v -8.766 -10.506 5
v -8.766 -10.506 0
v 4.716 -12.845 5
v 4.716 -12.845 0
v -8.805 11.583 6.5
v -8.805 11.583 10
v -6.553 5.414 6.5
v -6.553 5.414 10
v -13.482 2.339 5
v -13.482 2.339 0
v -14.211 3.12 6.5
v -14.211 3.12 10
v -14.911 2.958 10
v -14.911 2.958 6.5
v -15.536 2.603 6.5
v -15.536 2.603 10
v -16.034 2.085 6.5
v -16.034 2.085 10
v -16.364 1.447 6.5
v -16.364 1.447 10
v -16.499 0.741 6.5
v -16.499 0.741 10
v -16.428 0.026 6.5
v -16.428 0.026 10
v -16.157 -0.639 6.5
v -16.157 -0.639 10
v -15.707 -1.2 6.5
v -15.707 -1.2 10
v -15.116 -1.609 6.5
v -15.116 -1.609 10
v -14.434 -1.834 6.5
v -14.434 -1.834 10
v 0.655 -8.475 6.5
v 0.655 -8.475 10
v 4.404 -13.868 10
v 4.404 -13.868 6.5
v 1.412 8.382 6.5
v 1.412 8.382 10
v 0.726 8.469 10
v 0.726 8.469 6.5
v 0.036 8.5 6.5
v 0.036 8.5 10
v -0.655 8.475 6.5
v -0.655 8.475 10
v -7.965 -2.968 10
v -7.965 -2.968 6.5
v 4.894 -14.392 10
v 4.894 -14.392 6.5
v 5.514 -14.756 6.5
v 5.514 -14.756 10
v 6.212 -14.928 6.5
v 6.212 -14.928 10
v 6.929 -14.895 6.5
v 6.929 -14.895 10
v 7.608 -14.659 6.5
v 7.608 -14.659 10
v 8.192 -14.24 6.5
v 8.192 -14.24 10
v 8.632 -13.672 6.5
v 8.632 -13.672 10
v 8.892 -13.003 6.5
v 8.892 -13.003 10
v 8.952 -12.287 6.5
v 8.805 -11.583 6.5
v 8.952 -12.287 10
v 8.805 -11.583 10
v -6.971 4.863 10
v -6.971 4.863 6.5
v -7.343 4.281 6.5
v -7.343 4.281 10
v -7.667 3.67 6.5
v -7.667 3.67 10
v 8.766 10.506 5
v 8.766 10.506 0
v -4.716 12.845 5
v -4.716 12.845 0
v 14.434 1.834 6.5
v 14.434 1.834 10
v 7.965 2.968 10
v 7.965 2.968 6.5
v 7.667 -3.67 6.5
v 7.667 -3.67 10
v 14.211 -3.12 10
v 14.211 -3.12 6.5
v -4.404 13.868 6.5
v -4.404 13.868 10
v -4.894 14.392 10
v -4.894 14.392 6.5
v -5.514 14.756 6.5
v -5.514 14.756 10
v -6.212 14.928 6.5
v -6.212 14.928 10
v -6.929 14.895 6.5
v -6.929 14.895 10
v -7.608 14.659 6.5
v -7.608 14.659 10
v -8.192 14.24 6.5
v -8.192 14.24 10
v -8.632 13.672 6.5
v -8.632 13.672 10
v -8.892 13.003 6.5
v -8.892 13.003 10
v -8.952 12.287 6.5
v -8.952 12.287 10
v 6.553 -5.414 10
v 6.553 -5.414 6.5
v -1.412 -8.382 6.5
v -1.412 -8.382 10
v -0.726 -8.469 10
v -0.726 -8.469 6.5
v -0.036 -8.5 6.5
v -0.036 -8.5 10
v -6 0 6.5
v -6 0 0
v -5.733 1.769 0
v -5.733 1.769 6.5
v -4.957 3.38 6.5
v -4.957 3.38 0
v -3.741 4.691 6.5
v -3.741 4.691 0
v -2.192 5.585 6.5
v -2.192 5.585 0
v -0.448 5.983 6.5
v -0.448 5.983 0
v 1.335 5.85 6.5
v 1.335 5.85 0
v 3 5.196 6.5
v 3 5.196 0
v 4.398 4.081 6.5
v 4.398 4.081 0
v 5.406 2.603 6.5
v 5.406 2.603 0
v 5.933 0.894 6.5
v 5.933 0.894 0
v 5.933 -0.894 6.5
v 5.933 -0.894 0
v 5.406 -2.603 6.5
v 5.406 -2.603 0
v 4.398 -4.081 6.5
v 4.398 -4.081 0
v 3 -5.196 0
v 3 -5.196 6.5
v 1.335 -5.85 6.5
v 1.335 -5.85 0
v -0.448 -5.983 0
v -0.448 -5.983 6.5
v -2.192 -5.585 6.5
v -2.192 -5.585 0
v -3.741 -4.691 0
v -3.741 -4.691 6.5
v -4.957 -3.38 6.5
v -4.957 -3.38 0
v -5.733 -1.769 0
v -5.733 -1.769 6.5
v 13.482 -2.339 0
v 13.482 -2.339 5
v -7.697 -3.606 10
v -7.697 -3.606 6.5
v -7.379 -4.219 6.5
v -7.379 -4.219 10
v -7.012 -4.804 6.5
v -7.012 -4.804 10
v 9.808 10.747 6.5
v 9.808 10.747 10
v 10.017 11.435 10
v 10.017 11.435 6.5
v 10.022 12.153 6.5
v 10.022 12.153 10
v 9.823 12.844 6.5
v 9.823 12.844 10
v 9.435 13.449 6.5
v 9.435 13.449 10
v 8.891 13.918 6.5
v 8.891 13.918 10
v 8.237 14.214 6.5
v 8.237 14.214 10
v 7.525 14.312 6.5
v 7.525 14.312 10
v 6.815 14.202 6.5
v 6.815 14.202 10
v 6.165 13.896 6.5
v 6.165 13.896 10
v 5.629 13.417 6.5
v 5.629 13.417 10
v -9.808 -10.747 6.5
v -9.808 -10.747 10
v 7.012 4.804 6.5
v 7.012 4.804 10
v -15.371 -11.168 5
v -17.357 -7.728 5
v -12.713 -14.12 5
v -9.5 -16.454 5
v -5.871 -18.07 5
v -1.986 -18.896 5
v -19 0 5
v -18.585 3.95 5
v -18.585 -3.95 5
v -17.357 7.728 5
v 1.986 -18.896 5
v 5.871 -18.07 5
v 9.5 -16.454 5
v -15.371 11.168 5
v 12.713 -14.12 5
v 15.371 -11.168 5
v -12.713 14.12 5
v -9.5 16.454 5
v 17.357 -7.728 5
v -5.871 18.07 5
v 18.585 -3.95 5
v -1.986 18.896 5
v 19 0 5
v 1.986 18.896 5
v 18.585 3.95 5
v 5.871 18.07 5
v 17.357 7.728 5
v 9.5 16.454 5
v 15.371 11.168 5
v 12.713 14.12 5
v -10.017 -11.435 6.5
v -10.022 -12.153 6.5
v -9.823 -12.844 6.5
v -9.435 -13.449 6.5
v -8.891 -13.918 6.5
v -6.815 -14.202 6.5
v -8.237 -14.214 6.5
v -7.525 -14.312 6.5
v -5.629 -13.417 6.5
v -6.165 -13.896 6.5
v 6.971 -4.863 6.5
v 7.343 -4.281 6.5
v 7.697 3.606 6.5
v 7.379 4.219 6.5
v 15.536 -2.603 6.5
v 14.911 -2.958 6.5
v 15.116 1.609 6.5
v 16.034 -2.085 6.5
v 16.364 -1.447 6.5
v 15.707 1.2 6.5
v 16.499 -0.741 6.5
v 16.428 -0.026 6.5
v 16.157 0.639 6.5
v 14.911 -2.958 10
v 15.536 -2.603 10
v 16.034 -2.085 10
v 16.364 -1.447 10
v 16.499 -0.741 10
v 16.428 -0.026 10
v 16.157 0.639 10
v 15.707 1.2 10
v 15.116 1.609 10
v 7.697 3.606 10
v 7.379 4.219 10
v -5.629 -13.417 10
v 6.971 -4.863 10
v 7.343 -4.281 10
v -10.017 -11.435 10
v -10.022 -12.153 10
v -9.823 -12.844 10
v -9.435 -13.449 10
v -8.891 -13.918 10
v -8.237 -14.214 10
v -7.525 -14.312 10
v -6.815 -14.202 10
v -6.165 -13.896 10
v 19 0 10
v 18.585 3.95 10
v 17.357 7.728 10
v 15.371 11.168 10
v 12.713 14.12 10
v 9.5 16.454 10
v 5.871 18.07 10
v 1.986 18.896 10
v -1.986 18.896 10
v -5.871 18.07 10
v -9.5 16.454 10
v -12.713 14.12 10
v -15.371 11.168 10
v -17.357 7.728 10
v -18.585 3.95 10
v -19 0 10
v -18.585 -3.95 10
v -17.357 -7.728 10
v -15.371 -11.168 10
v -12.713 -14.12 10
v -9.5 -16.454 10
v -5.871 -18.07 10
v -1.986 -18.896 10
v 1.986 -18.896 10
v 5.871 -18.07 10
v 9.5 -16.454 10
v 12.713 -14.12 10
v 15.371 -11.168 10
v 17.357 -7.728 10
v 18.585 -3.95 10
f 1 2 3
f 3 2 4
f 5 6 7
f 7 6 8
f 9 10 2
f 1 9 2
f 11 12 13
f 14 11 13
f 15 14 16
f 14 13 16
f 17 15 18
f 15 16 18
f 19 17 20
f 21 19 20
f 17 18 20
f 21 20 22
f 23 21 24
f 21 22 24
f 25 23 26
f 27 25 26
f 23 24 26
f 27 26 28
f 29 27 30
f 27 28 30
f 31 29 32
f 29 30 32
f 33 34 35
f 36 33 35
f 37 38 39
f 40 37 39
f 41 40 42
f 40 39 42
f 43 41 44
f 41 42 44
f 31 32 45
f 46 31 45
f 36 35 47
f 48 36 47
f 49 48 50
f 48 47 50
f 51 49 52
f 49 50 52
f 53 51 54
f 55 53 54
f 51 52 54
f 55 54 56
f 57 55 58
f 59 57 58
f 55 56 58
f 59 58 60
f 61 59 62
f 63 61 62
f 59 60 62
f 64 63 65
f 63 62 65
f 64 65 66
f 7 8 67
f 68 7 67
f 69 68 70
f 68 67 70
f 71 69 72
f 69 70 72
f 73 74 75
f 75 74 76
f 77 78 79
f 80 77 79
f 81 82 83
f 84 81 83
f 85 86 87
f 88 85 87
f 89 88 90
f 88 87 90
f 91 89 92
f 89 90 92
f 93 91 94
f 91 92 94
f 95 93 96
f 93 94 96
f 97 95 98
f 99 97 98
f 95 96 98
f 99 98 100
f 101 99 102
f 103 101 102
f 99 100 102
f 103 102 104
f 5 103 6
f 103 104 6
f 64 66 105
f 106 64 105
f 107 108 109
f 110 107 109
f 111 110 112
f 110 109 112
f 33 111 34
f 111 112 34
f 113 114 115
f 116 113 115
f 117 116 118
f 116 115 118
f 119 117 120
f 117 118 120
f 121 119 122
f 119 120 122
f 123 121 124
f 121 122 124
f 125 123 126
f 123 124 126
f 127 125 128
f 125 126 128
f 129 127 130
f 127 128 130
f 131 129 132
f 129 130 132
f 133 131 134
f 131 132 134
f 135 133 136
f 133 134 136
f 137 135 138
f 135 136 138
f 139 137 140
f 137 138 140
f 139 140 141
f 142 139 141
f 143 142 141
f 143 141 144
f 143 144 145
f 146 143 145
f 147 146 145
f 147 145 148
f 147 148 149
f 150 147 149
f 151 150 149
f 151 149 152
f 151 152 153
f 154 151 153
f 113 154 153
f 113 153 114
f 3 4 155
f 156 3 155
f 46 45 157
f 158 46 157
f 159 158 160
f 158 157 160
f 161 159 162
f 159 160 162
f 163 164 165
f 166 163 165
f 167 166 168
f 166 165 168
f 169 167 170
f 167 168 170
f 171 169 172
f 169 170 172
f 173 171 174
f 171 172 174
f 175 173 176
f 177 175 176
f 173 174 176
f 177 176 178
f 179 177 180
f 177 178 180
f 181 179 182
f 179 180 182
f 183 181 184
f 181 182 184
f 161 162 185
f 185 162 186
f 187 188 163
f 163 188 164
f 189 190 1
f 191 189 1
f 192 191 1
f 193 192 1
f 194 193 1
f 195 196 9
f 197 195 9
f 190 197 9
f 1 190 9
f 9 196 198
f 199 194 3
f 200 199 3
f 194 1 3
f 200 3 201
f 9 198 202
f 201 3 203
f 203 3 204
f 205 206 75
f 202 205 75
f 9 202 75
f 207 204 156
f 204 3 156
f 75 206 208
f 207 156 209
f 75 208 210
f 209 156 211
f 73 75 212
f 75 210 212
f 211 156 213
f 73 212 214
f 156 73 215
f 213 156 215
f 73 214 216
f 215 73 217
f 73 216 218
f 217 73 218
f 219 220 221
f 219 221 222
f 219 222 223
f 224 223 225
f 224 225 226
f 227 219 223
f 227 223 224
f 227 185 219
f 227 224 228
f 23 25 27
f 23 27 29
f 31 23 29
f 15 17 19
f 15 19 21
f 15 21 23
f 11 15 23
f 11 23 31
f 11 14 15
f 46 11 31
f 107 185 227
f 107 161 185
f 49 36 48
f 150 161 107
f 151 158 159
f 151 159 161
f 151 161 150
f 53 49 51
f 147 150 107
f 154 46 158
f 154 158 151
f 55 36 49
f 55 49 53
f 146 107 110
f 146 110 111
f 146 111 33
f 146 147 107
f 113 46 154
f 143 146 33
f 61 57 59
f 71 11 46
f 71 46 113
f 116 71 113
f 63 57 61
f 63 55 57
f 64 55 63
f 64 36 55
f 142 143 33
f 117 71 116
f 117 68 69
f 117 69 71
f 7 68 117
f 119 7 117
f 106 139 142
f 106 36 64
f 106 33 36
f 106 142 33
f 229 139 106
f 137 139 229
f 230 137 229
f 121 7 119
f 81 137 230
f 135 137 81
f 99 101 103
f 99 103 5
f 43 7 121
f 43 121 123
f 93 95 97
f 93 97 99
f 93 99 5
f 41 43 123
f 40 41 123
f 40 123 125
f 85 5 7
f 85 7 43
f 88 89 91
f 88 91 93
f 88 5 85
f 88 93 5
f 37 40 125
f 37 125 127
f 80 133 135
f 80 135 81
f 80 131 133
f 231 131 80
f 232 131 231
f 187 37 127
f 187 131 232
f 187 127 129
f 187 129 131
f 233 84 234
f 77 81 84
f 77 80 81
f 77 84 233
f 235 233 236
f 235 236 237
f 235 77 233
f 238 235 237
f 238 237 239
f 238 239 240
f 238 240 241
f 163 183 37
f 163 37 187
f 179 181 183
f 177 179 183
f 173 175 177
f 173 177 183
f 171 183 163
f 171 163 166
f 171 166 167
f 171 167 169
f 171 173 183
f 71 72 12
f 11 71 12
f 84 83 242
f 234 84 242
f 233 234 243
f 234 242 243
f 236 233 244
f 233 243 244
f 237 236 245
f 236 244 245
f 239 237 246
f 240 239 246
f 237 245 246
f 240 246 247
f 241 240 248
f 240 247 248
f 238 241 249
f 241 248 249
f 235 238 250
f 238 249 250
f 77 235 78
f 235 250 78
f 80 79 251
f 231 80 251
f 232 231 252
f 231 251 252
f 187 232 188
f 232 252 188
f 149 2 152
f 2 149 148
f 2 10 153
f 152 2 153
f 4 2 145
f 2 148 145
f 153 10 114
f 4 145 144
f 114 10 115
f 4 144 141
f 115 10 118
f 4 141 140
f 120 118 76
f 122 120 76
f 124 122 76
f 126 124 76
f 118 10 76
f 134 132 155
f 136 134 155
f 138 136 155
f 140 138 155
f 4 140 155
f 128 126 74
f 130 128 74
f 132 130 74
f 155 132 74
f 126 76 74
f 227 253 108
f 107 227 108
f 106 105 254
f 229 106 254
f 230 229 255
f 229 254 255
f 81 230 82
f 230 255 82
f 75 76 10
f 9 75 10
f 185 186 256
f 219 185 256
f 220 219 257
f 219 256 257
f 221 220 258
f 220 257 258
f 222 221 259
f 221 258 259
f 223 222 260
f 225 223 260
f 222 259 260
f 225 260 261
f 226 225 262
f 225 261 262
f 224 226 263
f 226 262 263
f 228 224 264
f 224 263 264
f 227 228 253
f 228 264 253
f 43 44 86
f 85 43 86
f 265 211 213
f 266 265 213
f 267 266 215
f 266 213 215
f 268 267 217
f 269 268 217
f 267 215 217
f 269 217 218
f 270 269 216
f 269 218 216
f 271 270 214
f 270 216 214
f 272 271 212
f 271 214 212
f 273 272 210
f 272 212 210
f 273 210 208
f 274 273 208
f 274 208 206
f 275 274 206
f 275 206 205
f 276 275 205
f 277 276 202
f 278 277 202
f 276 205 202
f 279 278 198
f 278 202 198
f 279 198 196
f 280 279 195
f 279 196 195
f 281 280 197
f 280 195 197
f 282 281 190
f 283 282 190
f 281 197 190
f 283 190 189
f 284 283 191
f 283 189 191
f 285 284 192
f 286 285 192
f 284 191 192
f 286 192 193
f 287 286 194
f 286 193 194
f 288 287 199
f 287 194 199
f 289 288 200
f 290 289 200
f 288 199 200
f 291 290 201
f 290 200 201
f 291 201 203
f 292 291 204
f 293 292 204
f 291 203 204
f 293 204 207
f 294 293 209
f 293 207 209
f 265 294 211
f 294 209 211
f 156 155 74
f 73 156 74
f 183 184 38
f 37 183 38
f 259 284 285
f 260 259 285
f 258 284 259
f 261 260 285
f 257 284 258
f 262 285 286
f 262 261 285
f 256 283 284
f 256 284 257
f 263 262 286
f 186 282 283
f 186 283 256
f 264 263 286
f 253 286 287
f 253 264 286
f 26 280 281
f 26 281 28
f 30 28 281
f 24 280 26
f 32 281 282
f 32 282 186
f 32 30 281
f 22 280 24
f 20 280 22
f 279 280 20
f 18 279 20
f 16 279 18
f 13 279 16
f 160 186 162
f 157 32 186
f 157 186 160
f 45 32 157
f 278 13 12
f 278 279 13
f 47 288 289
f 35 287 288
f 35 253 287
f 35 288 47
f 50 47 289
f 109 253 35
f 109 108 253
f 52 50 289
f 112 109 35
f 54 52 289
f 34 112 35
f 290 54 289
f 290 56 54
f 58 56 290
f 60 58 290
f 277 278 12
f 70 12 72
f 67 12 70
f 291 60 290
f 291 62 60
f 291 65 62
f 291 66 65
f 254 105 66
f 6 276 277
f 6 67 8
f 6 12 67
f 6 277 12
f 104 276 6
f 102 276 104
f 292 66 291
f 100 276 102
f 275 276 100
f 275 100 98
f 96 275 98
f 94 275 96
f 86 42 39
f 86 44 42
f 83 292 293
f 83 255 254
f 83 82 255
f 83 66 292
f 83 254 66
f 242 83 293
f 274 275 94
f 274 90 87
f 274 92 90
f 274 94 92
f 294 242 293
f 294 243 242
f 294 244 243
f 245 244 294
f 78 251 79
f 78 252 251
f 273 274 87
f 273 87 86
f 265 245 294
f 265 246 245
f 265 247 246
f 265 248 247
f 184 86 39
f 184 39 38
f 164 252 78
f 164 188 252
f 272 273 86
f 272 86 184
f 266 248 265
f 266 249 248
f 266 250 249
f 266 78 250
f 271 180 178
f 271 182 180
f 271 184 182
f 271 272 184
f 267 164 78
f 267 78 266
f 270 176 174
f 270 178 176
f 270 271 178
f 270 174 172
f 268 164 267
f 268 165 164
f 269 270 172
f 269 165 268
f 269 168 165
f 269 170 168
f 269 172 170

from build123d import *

# Parameters (mm, degrees)
BOSS_EXTRUDE1_DEPTH = 5
SKETCH2_R           = 19
BOSS_EXTRUDE2_DEPTH = 5
CUT_EXTRUDE1_DEPTH  = 3.5
SKETCH4_R           = 6
CUT_EXTRUDE2_DEPTH  = 11


with BuildPart() as part:
    # Sketch1 → Boss-Extrude1 (new body)
    with BuildSketch(Plane.XY):
        Polygon((8.766334056, 10.506254671), (-4.715516416, 12.844995326), (-13.481850472, 2.338740655), (-8.766334056, -10.506254671), (4.715516416, -12.844995326), (13.481850472, -2.338740655), align=None)
    extrude(amount=BOSS_EXTRUDE1_DEPTH)

    # Sketch2 → Boss-Extrude2 (add)
    with BuildSketch(Plane.XY.offset(5)):
        Circle(SKETCH2_R)
    extrude(amount=BOSS_EXTRUDE2_DEPTH)

    # Sketch3 → Cut-Extrude1 (cut)
    with BuildSketch(Plane.XY.offset(10)):
        with BuildLine():
            Line((7.666666546, -3.670452843), (14.211444215, -3.120072648))
            ThreePointArc((14.211444215, -3.120072648), (16.499429689, -0.741033748), (14.433922262, 1.833530816))
            Line((14.433922262, 1.833530816), (7.964835621, 2.968399152))
            ThreePointArc((7.964835621, 2.968399152), (7.544489735, 3.915440541), (7.012038678, 4.80430157))
            Line((7.012038678, 4.80430157), (9.807784283, 10.74743539))
            ThreePointArc((9.807784283, 10.74743539), (8.89146974, 13.918407845), (5.629078153, 13.4169103))
            Line((5.629078153, 13.4169103), (1.411708737, 8.381949561))
            ThreePointArc((1.411708737, 8.381949561), (0.381373892, 8.49144004), (-0.654627868, 8.474754413))
            Line((-0.654627868, 8.474754413), (-4.403659932, 13.867508039))
            ThreePointArc((-4.403659932, 13.867508039), (-7.607959927, 14.659442582), (-8.804846066, 11.583379783))
            Line((-8.804846066, 11.583379783), (-6.553126885, 5.413550409))
            ThreePointArc((-6.553126885, 5.413550409), (-7.163115843, 4.575999499), (-7.666666546, 3.670452843))
            Line((-7.666666546, 3.670452843), (-14.211444215, 3.120072648))
            ThreePointArc((-14.211444215, 3.120072648), (-16.499429618, 0.741035318), (-14.433925359, -1.833530273))
            Line((-14.433925359, -1.833530273), (-7.964835621, -2.968399152))
            ThreePointArc((-7.964835621, -2.968399152), (-7.544489735, -3.915440541), (-7.012038678, -4.80430157))
            Line((-7.012038678, -4.80430157), (-9.807784283, -10.74743539))
            ThreePointArc((-9.807784283, -10.74743539), (-8.891470467, -13.918407381), (-5.629079261, -13.416911623))
            Line((-5.629079261, -13.416911623), (-1.411708737, -8.381949561))
            ThreePointArc((-1.411708737, -8.381949561), (-0.381373892, -8.49144004), (0.654627868, -8.474754413))
            Line((0.654627868, -8.474754413), (4.403659932, -13.867508039))
            ThreePointArc((4.403659932, -13.867508039), (7.607959014, -14.659443056), (8.804846772, -11.583381715))
            Line((8.804846772, -11.583381715), (6.553126885, -5.413550409))
            ThreePointArc((6.553126885, -5.413550409), (7.163115843, -4.575999499), (7.666666546, -3.670452843))
        make_face()
    extrude(amount=-CUT_EXTRUDE1_DEPTH, mode=Mode.SUBTRACT)

    # Sketch4 → Cut-Extrude2 (cut, through all)
    with BuildSketch(Plane(origin=(0, 0, 0), x_dir=(-1, 0, 0), z_dir=(0, 0, -1))):
        Circle(SKETCH4_R)
    extrude(amount=-CUT_EXTRUDE2_DEPTH, mode=Mode.SUBTRACT)


solid = part.part
